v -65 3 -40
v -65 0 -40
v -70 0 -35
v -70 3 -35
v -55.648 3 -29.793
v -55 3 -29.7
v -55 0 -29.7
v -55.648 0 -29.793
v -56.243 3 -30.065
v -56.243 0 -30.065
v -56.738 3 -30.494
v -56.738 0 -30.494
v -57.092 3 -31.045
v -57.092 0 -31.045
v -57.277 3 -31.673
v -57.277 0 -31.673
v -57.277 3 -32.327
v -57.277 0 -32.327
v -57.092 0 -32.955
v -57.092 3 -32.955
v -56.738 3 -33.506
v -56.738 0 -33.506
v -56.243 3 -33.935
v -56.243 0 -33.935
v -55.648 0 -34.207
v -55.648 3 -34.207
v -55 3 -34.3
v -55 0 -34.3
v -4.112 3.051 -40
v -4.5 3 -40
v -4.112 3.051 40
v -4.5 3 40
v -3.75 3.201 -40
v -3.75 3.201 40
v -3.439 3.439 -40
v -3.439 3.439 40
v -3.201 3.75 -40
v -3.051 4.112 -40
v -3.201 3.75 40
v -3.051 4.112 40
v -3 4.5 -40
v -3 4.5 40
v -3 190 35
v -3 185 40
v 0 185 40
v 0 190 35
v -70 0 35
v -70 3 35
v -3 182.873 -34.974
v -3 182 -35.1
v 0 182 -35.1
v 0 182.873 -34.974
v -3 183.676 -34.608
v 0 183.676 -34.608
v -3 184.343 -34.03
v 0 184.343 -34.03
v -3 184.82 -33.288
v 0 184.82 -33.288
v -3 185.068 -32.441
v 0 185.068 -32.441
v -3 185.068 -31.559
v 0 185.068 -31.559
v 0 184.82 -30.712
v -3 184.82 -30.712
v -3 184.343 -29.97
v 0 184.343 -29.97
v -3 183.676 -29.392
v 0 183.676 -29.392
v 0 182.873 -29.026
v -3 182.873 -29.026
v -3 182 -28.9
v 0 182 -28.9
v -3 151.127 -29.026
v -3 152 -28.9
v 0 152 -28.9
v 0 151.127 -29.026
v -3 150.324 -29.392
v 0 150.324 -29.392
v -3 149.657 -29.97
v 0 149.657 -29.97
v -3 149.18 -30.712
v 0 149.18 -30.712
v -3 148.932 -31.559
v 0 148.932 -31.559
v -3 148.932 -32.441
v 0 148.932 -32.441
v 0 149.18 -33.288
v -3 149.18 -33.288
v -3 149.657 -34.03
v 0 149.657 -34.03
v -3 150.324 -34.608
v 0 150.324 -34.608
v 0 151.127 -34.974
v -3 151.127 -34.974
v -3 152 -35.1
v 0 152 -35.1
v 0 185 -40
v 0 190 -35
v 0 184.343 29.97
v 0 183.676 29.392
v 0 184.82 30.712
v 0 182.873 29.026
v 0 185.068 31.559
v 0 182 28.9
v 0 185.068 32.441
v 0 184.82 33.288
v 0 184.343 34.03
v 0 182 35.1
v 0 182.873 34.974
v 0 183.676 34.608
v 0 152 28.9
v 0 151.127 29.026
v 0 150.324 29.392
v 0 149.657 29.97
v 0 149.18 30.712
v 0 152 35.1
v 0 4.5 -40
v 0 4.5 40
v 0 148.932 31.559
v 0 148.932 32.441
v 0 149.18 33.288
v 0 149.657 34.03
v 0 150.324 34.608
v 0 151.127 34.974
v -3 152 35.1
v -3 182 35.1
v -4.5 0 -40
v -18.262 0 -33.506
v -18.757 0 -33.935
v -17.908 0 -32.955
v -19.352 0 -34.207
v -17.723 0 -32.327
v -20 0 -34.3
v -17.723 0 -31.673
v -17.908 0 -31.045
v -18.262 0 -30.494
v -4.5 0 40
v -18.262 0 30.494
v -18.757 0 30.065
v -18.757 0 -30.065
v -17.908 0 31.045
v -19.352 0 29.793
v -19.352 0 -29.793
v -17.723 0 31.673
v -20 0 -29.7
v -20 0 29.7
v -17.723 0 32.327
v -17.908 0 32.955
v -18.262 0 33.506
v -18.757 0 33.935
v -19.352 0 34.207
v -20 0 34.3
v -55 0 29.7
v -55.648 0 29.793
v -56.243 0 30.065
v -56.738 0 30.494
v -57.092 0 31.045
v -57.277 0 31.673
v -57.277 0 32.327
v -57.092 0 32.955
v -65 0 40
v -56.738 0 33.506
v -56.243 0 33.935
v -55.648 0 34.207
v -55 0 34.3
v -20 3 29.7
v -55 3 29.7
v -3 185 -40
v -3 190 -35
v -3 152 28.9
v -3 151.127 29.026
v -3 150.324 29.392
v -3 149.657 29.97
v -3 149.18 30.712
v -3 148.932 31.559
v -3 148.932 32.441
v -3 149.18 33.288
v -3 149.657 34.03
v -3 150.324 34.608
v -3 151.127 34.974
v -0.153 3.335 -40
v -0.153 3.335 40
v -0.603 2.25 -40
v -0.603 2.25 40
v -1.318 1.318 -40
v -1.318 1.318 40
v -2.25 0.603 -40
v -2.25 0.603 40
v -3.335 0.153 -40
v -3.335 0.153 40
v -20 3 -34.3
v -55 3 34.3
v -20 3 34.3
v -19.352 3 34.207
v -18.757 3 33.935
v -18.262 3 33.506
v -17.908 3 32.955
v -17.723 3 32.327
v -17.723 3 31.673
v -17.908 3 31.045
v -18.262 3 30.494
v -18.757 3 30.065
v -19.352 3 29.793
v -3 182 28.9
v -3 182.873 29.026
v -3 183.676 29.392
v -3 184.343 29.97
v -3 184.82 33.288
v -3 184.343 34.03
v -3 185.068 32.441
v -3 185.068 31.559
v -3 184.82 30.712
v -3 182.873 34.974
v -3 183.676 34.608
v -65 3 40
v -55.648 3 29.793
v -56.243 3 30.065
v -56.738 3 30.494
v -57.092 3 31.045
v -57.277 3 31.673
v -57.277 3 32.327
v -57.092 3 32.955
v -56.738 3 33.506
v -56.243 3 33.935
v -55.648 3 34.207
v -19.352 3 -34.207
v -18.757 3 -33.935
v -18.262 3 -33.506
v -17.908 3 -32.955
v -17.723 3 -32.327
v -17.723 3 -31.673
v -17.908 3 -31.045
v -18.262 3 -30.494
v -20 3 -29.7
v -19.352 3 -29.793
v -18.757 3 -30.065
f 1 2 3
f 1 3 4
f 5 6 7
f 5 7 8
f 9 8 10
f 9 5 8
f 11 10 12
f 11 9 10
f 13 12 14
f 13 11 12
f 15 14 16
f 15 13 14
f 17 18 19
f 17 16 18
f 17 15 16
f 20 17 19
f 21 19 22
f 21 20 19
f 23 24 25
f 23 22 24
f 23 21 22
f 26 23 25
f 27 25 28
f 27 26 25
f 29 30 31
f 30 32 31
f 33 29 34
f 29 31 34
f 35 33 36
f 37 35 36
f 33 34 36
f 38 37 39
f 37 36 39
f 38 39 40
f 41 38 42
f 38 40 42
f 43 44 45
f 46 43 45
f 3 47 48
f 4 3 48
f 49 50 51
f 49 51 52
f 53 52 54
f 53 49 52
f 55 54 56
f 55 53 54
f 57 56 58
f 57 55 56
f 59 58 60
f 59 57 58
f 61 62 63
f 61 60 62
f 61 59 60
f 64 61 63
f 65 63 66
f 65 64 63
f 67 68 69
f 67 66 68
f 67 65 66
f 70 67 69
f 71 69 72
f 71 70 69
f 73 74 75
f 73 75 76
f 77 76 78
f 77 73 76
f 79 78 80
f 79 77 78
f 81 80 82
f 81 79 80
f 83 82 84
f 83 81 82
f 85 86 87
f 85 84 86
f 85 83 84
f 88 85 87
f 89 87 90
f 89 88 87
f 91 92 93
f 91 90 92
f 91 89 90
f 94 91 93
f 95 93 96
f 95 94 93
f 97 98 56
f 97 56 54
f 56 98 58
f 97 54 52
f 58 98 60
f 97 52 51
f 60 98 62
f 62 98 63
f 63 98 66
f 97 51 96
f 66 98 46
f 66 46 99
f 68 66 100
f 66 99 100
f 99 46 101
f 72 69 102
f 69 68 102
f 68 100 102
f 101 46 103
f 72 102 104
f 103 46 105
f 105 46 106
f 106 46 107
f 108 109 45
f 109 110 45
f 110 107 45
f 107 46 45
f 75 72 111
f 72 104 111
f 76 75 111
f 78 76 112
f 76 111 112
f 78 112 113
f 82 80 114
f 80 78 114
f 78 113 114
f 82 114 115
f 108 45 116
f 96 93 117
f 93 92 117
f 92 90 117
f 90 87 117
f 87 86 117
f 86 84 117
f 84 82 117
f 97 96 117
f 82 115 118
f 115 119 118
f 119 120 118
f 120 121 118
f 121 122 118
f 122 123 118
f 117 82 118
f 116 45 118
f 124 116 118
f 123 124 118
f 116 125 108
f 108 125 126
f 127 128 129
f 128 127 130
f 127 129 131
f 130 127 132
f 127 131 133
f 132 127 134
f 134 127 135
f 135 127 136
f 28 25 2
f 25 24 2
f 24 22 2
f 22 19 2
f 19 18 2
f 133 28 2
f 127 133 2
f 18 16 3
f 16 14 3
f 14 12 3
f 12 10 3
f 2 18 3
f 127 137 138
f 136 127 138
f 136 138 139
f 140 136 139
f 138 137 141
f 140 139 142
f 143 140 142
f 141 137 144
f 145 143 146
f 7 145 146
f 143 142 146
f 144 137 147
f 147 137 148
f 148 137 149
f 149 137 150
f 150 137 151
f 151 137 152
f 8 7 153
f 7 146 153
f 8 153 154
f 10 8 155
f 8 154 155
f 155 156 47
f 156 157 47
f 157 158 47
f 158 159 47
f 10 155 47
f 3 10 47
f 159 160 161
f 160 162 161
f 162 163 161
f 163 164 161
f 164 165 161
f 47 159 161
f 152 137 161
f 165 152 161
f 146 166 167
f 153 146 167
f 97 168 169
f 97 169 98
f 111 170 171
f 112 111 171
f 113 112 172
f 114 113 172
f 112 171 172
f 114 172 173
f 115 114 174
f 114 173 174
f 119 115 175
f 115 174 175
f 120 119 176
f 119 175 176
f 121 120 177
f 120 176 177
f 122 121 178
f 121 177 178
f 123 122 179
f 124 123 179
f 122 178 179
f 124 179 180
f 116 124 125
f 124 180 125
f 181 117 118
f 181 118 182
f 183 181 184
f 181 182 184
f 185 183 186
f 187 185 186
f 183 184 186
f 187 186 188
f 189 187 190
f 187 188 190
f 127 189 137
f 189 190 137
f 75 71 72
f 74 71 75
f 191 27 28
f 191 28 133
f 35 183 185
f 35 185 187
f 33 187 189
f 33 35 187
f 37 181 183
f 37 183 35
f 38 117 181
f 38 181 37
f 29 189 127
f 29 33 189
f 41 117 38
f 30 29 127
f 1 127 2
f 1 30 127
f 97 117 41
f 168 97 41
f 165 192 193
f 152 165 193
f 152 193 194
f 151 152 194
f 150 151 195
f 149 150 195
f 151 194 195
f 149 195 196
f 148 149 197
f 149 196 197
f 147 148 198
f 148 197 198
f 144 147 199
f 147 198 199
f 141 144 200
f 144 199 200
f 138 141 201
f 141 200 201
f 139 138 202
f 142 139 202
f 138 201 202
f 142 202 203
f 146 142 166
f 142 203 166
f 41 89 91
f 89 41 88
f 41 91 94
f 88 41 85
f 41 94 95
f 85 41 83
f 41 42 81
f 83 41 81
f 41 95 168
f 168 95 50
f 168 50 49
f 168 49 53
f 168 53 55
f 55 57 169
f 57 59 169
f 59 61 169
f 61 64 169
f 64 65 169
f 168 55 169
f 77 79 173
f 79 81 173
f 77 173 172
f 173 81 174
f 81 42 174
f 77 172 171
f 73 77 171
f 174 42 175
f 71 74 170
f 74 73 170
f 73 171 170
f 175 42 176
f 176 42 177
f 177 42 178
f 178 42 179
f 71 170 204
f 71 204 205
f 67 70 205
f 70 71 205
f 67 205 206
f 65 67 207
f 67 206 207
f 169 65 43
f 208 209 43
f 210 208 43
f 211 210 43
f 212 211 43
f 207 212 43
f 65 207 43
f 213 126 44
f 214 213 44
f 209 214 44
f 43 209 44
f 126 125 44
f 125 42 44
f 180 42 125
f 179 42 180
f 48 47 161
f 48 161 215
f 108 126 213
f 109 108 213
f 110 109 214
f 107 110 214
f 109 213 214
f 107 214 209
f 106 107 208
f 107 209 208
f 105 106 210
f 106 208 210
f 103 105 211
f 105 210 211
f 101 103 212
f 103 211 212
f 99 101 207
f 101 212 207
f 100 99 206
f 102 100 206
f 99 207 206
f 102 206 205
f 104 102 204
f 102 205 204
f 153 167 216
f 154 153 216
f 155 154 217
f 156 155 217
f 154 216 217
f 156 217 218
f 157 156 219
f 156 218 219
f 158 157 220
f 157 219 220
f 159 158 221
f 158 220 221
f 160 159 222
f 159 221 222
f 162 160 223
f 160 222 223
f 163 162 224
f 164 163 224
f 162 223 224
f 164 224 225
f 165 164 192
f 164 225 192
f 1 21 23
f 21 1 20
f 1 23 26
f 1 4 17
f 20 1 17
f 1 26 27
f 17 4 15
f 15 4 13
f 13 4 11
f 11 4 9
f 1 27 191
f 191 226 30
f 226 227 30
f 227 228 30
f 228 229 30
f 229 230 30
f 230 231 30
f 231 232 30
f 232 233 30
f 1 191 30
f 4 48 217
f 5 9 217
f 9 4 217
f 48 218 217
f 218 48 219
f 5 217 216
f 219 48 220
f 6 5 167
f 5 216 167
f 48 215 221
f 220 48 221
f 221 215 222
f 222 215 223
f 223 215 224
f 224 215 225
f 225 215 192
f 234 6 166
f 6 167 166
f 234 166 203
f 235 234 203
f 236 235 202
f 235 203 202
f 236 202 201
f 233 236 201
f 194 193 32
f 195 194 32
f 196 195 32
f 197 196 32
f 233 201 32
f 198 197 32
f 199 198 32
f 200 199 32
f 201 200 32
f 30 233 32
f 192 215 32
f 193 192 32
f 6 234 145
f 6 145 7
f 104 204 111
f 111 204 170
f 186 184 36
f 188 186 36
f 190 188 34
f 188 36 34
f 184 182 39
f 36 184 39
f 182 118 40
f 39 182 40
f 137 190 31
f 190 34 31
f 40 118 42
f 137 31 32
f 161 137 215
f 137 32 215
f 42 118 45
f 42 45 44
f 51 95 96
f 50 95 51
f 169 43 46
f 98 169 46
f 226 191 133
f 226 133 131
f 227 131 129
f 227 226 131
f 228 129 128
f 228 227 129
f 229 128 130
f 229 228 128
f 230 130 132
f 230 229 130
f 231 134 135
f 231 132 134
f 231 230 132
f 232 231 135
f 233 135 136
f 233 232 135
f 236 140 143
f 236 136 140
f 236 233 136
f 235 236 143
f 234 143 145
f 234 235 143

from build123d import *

# Parameters (mm, degrees)
SM_BASE_FLANGE_1_DEPTH = 40
CHAMFER_1_SIZE         = 5
CUT_EXTRUDE_1_DEPTH    = 206.399610516
CUT_EXTRUDE_2_DEPTH    = 204.639387153


# Sheet-metal steps are written as plain solids
with BuildPart() as part:
    # Sketch 2 → 基体-法兰1 (new, symmetric)
    with BuildSketch(Plane.XY):
        with BuildLine():
            Line((0, 190), (0, 4.5))
            ThreePointArc((0, 4.5), (-1.318019485, 1.318019485), (-4.5, 0))
            Line((-4.5, 0), (-70, 0))
            Line((-70, 0), (-70, 3))
            Line((-70, 3), (-4.5, 3))
            ThreePointArc((-4.5, 3), (-3.439339828, 3.439339828), (-3, 4.5))
            Line((-3, 4.5), (-3, 190))
            Line((-3, 190), (0, 190))
        make_face()
    extrude(amount=SM_BASE_FLANGE_1_DEPTH, both=True)

    # 倒角1
    chamfer_1_edges = [part.edges().sort_by_distance(p)[0] for p in [
        (-1.5, 190, 40),
        (-70, 1.5, 40),
        (-1.5, 190, -40),
        (-70, 1.5, -40),
    ]]
    chamfer(chamfer_1_edges, length=CHAMFER_1_SIZE)

    # 草图7 → 切除-拉伸1 (cut, through all)
    with BuildSketch(Plane.ZY.offset(3)):
        with BuildLine():
            Line((-28.9, 182), (-28.9, 152))
            ThreePointArc((-28.9, 152), (-32, 148.9), (-35.1, 152))
            Line((-35.1, 152), (-35.1, 182))
            ThreePointArc((-35.1, 182), (-32, 185.1), (-28.9, 182))
        make_face()
    cut_extrude_1 = extrude(amount=-CUT_EXTRUDE_1_DEPTH, mode=Mode.SUBTRACT)

    # 草图10 → 切除-拉伸2 (cut, through all)
    with BuildSketch(Plane(origin=(0, 3, 0), x_dir=(1, 0, 0), z_dir=(0, 1, 0))):
        with BuildLine():
            Line((-55, 34.3), (-20, 34.3))
            ThreePointArc((-20, 34.3), (-17.7, 32), (-20, 29.7))
            Line((-20, 29.7), (-55, 29.7))
            ThreePointArc((-55, 29.7), (-57.3, 32), (-55, 34.3))
        make_face()
    cut_extrude_2 = extrude(amount=-CUT_EXTRUDE_2_DEPTH, mode=Mode.SUBTRACT)

    # 镜向1: 切除-拉伸1, 切除-拉伸2 across plane
    add(cut_extrude_1.mirror(Plane.XY), mode=Mode.SUBTRACT)
    add(cut_extrude_2.mirror(Plane.XY), mode=Mode.SUBTRACT)


solid = part.part
